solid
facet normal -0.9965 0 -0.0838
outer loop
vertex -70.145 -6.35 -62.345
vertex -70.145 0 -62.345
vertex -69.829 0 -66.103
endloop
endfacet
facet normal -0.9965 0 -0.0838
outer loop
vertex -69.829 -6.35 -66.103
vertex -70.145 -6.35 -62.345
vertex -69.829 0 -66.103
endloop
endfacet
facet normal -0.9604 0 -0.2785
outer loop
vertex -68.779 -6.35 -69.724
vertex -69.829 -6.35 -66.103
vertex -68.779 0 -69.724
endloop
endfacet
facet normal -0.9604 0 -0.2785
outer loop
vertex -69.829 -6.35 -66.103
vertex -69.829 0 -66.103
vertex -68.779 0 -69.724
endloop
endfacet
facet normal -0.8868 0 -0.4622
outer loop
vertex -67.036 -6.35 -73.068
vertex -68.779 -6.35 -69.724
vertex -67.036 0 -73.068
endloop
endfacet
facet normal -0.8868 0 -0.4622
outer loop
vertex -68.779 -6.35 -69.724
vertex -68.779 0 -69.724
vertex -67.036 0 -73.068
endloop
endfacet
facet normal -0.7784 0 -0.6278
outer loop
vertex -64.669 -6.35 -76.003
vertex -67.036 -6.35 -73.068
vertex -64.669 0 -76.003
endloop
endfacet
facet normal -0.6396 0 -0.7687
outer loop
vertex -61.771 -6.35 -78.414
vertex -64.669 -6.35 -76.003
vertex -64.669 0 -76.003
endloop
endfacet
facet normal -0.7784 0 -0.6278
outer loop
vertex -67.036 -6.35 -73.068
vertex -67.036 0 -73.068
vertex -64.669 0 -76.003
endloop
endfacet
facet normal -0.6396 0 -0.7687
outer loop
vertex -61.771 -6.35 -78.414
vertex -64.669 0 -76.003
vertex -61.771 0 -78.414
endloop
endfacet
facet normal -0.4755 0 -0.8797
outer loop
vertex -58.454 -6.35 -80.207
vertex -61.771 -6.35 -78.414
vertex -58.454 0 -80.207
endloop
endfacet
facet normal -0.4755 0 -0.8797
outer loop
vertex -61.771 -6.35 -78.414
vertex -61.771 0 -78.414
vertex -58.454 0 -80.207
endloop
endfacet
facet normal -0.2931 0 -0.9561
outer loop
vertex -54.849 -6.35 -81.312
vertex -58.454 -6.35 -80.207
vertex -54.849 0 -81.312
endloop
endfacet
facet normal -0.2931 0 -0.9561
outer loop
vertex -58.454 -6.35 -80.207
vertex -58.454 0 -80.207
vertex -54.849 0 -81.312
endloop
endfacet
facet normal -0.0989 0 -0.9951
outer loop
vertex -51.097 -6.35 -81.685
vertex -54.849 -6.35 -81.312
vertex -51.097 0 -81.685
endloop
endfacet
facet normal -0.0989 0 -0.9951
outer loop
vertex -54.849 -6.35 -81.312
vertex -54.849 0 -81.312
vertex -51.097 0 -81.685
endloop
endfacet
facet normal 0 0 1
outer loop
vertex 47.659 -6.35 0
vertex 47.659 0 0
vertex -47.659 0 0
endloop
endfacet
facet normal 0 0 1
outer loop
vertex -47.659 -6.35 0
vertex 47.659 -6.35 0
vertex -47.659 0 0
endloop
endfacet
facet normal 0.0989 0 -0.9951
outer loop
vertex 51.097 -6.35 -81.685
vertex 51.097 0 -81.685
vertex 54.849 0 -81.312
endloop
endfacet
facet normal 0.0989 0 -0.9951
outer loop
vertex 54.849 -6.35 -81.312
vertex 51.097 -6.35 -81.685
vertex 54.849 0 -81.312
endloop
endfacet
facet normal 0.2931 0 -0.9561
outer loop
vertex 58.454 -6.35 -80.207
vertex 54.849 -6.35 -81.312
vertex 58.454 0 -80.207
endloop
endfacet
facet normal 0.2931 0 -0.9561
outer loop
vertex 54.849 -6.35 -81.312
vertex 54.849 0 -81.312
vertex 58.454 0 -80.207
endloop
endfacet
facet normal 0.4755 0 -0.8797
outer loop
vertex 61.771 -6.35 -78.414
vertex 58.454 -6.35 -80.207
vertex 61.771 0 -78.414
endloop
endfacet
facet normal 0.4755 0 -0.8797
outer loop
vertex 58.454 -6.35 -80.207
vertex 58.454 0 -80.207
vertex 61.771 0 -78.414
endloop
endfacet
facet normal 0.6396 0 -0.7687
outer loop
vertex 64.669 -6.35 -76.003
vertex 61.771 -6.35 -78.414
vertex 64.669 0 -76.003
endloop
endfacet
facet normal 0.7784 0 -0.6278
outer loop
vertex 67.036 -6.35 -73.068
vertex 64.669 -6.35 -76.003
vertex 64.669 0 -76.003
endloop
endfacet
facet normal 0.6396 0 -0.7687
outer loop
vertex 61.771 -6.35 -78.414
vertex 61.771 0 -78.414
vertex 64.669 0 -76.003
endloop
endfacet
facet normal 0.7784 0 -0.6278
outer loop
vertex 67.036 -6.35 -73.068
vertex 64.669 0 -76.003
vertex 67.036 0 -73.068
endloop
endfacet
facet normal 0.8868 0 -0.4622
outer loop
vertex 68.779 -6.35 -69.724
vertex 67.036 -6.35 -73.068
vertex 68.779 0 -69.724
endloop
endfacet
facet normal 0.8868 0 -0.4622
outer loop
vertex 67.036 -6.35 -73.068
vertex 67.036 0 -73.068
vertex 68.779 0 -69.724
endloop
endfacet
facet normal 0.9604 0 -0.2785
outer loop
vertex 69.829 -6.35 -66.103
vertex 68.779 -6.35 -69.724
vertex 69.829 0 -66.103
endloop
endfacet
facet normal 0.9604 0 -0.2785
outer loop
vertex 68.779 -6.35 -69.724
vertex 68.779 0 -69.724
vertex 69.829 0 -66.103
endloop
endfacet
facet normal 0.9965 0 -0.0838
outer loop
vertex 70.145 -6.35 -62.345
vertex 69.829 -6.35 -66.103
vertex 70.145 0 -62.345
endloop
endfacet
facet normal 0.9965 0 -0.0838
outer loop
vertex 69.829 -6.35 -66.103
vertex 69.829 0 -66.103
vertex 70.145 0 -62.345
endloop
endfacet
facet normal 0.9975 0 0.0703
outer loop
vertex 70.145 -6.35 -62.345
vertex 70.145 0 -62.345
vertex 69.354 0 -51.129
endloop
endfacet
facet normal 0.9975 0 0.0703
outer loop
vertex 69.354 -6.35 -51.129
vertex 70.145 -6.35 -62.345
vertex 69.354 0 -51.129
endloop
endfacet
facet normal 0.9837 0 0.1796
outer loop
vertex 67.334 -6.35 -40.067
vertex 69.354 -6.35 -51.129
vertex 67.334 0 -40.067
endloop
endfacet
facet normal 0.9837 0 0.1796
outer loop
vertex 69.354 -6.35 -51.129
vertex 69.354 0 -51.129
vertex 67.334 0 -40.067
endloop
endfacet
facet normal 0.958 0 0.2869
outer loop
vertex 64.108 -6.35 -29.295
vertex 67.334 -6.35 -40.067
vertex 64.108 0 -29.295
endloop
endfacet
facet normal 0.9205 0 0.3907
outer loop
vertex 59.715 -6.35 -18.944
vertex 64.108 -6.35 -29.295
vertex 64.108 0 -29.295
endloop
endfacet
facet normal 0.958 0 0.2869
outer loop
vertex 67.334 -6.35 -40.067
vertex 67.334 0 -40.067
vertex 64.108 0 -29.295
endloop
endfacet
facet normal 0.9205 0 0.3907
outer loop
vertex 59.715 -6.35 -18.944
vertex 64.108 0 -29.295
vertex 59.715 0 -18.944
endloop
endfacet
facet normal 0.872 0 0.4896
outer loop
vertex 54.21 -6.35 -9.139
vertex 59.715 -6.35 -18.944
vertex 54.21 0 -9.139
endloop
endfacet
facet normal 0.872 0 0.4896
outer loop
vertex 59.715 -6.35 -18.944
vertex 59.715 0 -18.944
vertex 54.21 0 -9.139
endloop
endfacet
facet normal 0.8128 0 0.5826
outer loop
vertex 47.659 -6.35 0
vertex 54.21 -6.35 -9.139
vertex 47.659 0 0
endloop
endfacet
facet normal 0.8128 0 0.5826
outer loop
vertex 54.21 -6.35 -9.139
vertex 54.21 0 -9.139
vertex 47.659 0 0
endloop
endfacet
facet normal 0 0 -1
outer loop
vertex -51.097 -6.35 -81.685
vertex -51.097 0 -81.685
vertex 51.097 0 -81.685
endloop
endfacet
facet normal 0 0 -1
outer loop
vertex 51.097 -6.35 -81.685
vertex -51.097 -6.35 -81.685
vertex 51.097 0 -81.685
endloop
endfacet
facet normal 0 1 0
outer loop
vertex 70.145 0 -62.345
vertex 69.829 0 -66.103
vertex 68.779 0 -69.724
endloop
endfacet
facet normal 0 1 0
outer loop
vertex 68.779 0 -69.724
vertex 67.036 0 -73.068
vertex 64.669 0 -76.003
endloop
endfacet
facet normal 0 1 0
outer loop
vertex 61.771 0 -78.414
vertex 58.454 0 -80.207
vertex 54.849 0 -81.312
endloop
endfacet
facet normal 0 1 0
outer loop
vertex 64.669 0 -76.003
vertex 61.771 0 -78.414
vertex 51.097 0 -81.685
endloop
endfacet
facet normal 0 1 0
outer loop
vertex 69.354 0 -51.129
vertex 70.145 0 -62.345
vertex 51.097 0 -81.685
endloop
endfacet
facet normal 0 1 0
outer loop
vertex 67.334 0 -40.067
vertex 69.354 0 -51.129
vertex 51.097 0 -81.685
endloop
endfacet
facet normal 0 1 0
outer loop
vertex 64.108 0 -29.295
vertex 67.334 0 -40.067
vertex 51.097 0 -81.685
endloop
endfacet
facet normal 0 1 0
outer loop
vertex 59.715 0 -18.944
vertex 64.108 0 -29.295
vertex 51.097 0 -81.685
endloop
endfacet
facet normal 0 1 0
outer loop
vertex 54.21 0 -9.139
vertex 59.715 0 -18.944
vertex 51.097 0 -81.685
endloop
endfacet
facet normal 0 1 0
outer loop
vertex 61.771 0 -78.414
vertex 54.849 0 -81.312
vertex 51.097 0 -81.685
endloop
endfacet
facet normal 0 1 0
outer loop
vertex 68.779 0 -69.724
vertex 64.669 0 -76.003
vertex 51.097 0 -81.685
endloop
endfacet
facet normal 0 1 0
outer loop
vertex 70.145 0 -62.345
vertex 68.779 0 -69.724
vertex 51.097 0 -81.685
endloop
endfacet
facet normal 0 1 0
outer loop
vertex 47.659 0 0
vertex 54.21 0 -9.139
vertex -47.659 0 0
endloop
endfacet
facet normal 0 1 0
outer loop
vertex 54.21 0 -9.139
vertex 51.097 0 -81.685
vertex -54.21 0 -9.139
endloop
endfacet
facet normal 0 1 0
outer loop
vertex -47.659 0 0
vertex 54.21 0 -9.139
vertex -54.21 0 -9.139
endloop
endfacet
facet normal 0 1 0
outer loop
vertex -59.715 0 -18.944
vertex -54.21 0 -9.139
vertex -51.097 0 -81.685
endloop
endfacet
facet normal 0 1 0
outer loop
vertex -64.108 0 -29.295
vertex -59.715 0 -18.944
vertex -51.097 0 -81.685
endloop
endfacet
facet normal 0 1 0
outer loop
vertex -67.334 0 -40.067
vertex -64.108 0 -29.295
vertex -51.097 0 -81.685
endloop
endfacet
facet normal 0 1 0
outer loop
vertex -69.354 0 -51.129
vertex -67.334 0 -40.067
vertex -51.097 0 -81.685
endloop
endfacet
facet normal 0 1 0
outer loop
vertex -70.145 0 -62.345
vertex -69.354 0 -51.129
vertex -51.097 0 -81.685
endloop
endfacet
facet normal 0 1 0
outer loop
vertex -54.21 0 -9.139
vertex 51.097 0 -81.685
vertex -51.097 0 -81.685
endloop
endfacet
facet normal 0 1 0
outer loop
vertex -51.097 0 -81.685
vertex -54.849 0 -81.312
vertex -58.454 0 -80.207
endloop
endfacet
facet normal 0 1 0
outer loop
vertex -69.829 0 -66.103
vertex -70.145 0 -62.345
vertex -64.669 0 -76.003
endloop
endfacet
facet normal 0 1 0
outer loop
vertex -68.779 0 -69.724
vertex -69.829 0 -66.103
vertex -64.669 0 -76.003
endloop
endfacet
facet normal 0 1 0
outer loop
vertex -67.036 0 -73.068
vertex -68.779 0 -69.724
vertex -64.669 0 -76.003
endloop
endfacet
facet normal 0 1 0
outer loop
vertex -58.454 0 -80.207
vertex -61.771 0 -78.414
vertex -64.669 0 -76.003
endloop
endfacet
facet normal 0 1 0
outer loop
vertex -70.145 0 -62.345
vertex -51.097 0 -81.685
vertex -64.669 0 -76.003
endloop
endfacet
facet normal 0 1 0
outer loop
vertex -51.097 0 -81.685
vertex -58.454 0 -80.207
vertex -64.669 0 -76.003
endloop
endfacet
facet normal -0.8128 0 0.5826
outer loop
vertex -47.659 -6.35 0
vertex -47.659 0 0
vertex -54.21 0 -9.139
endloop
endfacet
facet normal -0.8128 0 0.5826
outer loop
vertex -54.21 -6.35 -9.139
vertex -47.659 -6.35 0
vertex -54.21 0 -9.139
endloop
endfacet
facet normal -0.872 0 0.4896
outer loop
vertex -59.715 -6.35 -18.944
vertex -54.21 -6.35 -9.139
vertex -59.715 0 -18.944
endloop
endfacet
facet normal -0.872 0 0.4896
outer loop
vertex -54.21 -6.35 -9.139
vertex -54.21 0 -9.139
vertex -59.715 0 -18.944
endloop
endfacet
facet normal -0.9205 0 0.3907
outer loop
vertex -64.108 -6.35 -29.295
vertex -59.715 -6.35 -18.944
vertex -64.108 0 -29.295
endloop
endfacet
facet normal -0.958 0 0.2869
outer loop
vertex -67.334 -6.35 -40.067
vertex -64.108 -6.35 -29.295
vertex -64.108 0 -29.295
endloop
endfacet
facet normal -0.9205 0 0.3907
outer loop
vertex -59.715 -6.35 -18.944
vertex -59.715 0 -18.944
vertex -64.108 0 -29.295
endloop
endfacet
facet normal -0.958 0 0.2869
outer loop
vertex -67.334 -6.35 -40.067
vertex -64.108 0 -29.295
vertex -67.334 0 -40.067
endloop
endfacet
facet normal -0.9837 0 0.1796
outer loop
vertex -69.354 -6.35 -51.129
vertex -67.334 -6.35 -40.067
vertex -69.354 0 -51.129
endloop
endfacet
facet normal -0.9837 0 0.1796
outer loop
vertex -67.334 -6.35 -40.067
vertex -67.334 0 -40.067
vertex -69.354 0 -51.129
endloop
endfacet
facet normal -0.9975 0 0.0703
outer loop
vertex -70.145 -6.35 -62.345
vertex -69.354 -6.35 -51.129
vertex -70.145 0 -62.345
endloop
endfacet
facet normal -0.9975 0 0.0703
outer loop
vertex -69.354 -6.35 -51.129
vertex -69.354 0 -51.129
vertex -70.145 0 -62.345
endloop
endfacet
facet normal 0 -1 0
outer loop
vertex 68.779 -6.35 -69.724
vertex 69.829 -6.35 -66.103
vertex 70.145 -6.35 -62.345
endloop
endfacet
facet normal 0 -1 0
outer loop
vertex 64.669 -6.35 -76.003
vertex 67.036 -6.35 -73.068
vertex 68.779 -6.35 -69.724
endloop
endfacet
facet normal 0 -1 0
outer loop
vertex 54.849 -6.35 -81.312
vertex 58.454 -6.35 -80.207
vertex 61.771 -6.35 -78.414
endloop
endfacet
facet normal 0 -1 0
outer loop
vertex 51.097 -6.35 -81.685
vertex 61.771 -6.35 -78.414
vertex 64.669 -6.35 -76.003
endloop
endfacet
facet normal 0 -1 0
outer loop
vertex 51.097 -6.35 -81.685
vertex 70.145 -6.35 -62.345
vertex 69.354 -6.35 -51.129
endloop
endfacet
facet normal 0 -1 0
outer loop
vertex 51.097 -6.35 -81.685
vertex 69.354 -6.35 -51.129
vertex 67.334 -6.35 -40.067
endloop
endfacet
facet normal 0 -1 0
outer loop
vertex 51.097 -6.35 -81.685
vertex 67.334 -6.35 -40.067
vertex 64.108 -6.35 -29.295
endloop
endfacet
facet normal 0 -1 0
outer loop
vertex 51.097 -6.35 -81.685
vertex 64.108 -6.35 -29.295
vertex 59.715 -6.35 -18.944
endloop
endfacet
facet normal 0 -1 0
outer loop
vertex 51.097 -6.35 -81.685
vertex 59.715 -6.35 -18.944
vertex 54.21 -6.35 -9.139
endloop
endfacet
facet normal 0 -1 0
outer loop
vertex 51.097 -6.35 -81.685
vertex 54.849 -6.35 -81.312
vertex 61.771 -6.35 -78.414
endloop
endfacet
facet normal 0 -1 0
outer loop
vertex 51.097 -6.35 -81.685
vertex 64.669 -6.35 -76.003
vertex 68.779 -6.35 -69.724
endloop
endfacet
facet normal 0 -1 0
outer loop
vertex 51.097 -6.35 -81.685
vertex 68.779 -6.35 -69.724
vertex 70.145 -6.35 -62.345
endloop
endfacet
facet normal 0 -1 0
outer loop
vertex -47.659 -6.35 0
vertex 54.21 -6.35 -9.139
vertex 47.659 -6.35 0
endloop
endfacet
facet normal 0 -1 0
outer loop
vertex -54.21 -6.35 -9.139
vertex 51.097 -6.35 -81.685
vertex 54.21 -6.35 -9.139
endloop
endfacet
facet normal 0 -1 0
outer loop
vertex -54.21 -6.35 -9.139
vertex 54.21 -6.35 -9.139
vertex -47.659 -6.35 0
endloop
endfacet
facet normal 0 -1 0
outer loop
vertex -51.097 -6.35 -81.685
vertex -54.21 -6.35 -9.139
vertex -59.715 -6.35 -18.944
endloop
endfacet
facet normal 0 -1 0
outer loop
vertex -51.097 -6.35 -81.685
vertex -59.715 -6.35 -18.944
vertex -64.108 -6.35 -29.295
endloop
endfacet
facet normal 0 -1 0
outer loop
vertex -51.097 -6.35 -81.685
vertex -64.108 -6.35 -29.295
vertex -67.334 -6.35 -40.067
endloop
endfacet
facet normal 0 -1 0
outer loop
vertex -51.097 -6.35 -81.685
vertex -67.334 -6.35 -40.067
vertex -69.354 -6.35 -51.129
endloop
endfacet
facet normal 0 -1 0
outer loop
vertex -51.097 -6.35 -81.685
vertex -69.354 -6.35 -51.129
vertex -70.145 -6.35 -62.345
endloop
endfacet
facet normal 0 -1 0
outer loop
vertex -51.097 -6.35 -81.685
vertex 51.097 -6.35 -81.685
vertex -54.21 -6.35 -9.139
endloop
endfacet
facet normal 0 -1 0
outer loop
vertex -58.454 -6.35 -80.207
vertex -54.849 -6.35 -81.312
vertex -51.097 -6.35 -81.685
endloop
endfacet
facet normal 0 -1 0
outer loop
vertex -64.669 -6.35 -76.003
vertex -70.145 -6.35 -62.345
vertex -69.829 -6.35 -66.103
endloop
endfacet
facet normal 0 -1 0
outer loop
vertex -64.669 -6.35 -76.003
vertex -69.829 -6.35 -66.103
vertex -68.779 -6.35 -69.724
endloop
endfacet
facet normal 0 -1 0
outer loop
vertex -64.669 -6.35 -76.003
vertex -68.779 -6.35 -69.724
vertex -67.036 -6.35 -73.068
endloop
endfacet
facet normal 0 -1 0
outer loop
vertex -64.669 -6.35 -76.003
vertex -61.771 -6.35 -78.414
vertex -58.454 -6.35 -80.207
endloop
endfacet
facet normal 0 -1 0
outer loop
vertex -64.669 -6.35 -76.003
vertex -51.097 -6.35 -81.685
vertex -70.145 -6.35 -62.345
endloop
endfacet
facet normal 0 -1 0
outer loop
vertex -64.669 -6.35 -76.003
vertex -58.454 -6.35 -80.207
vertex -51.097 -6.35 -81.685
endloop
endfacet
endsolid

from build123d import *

# Parameters (mm, degrees)
EXTRUDE3_DEPTH = 6.35


with BuildPart() as part:
    # Sketch12 → Extrude3 (new body)
    with BuildSketch(Plane(origin=(0, 0, 0), x_dir=(1, 0, 0), z_dir=(0, 1, 0))):
        with BuildLine():
            Line((47.659255792, 0), (-47.659255792, 0))
            ThreePointArc((-47.659255792, 0), (-64.107574089, 29.295195073), (-70.144576115, 62.345312104))
            ThreePointArc((-70.144576115, 62.345312104), (-64.669164862, 76.002515657), (-51.096777519, 81.684912961))
            Line((-51.096777519, 81.684912961), (51.096777519, 81.684912961))
            ThreePointArc((51.096777519, 81.684912961), (64.669164862, 76.002515657), (70.144576115, 62.345312104))
            ThreePointArc((70.144576115, 62.345312104), (64.107574089, 29.295195073), (47.659255792, 0))
        make_face()
    extrude(amount=-EXTRUDE3_DEPTH)


solid = part.part
